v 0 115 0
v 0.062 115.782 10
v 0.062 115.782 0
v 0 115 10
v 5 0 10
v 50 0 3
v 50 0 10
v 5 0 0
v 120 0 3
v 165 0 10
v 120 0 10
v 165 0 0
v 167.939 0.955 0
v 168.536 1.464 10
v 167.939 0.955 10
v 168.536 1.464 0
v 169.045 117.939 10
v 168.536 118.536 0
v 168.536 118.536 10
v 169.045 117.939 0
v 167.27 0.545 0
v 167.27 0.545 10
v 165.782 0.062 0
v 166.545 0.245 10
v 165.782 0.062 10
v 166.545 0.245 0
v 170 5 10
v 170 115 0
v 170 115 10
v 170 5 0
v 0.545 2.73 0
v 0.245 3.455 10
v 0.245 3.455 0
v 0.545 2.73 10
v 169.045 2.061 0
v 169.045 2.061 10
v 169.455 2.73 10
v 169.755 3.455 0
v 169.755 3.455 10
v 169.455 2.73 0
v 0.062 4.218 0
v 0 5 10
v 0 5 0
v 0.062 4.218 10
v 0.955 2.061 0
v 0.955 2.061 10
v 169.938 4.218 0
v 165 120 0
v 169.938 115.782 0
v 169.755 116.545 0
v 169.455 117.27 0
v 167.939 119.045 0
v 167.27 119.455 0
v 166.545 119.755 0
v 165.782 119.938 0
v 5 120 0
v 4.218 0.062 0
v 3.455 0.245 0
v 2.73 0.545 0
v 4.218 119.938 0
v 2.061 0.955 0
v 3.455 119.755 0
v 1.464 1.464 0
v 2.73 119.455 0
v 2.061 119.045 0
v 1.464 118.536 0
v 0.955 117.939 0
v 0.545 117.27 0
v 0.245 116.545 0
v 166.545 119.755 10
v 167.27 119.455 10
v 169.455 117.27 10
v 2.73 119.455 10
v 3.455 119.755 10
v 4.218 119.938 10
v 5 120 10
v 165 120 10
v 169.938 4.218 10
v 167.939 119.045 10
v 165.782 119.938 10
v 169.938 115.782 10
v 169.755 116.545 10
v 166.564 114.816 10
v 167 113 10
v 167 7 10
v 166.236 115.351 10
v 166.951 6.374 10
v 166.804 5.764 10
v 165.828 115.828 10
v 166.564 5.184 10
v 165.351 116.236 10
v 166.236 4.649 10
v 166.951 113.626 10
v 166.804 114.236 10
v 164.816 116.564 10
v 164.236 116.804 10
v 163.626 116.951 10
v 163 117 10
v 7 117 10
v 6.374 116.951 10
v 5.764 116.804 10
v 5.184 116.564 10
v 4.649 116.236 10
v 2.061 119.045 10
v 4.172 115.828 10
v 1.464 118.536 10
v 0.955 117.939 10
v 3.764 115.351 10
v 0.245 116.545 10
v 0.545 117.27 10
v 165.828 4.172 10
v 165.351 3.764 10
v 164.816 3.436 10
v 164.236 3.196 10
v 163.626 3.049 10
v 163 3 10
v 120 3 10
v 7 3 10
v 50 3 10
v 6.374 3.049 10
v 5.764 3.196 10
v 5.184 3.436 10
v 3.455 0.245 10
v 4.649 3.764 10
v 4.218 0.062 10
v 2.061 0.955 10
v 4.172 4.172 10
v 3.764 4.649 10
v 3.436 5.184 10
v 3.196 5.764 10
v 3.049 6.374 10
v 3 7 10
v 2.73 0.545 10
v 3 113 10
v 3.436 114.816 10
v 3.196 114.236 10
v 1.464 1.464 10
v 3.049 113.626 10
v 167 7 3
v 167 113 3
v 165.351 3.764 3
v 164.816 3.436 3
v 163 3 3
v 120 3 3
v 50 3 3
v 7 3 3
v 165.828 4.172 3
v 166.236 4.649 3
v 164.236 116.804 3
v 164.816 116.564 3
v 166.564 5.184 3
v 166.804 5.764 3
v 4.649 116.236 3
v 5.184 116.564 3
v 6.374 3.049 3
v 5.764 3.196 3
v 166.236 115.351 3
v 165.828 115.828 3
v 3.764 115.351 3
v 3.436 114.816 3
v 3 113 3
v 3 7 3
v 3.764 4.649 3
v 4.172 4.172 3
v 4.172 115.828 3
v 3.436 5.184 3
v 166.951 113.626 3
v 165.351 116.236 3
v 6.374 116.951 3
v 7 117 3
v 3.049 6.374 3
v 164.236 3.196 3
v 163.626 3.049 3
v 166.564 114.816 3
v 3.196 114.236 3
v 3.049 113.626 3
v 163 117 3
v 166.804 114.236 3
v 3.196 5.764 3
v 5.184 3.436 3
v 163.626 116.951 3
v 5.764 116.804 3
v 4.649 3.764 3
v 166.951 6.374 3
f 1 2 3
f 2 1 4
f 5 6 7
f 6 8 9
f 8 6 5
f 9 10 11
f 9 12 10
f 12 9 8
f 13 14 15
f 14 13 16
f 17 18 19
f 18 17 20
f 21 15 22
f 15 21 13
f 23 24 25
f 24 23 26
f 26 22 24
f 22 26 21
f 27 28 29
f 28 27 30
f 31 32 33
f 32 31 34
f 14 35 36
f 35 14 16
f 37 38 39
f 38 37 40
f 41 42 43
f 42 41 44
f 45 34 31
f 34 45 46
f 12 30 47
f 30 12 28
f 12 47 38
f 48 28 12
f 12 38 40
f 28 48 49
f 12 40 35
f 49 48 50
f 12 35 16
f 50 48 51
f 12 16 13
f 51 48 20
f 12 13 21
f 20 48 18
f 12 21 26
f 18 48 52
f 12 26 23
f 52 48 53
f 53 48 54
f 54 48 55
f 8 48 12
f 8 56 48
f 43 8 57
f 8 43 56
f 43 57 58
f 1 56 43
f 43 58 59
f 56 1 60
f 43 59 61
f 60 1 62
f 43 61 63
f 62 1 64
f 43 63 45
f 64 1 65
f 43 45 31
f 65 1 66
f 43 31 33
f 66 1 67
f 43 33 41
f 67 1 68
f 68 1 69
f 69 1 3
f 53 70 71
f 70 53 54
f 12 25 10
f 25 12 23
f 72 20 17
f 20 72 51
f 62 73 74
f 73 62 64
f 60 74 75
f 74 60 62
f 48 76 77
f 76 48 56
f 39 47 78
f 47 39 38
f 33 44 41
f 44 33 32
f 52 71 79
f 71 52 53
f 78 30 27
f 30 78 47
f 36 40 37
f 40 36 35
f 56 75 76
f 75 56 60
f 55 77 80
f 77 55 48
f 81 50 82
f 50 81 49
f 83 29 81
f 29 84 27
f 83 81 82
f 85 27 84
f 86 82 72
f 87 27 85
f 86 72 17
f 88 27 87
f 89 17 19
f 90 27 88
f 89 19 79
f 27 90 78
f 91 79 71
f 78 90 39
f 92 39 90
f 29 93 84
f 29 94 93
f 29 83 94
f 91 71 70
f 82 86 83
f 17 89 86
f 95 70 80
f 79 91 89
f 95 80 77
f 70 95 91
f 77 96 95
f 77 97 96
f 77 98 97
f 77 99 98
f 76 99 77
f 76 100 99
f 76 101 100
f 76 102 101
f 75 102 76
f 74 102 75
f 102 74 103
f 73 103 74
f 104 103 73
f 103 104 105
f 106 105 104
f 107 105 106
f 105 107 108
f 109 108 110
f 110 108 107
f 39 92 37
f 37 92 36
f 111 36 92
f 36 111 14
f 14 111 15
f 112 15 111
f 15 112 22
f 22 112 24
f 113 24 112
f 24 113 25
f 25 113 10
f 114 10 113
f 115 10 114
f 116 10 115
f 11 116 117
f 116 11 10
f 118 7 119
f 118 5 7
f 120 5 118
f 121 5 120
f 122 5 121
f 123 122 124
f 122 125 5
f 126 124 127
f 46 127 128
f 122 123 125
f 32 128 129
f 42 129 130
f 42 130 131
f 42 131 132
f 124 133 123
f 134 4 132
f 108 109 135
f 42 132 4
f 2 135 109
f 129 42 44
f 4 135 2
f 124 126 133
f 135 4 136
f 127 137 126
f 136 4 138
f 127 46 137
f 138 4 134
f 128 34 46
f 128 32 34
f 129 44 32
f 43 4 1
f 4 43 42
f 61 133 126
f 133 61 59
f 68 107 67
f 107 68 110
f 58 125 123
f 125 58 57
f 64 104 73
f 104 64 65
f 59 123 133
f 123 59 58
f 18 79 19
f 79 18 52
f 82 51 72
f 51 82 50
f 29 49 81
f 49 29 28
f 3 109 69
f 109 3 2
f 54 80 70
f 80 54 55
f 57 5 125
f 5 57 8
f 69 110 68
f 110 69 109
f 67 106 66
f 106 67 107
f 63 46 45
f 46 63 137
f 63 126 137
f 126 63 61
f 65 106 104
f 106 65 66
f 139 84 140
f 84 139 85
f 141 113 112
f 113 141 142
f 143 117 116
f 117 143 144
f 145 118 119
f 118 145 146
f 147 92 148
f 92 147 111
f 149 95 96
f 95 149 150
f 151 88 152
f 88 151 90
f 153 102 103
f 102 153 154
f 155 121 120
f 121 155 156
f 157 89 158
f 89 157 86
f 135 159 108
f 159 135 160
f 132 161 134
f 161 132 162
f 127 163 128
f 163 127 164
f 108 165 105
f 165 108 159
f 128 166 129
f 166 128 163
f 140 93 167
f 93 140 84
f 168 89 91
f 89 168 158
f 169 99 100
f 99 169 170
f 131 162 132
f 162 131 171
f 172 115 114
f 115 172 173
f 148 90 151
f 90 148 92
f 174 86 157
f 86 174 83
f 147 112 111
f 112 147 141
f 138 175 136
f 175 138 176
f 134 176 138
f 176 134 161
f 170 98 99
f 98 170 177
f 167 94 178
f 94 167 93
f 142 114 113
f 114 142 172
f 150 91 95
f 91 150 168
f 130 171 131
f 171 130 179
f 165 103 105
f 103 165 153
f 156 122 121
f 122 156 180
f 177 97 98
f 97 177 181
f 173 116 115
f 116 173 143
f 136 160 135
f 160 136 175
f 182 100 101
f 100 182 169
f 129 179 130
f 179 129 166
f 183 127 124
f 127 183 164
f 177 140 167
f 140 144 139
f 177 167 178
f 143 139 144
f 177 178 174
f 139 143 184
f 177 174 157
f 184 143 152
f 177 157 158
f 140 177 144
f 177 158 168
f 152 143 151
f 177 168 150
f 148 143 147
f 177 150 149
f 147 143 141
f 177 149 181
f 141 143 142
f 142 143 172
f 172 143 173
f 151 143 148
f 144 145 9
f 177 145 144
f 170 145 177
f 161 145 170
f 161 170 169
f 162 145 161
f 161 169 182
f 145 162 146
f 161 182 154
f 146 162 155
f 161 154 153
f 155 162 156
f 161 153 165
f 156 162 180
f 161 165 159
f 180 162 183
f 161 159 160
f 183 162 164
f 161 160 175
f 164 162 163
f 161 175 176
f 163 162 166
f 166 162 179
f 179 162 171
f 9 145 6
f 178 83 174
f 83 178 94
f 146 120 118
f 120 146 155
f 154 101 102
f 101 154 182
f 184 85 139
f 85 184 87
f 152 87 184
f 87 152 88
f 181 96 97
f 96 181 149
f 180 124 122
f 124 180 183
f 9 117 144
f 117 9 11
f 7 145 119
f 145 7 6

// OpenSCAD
//======================================================
// NODE 1 DETACHABLE LID
//======================================================

//======================================================
// SETTINGS
//======================================================

wall = 3;

box_length = 170;
box_width  = 120;

lid_height = 10;

corner = 5;

//======================================================
// LID
//======================================================

difference(){

    //--------------------------------------------------
    // OUTER LID
    //--------------------------------------------------

    roundedBox(box_length, box_width, lid_height, corner);

    //--------------------------------------------------
    // INNER HOLLOW
    //--------------------------------------------------

    translate([wall,wall,wall])

    roundedBox(
        box_length-wall*2,
        box_width-wall*2,
        lid_height,
        corner-1
    );

    //--------------------------------------------------
    // LCD WINDOW
    //--------------------------------------------------

    translate([50,-1,3])
    cube([70,6,25]);

    //--------------------------------------------------
    // GREEN LED HOLE
    //--------------------------------------------------

    translate([38,-1,15])
    rotate([90,0,0])
    cylinder(h=6,d=5,$fn=30);

    //--------------------------------------------------
    // RED LED HOLE
    //--------------------------------------------------

    translate([132,-1,15])
    rotate([90,0,0])
    cylinder(h=6,d=5,$fn=30);
}

//======================================================
// MODULES
//======================================================

module roundedBox(l,w,h,r){

    hull(){

        translate([r,r,0])
        cylinder(r=r,h=h,$fn=40);

        translate([l-r,r,0])
        cylinder(r=r,h=h,$fn=40);

        translate([r,w-r,0])
        cylinder(r=r,h=h,$fn=40);

        translate([l-r,w-r,0])
        cylinder(r=r,h=h,$fn=40);
    }
}
